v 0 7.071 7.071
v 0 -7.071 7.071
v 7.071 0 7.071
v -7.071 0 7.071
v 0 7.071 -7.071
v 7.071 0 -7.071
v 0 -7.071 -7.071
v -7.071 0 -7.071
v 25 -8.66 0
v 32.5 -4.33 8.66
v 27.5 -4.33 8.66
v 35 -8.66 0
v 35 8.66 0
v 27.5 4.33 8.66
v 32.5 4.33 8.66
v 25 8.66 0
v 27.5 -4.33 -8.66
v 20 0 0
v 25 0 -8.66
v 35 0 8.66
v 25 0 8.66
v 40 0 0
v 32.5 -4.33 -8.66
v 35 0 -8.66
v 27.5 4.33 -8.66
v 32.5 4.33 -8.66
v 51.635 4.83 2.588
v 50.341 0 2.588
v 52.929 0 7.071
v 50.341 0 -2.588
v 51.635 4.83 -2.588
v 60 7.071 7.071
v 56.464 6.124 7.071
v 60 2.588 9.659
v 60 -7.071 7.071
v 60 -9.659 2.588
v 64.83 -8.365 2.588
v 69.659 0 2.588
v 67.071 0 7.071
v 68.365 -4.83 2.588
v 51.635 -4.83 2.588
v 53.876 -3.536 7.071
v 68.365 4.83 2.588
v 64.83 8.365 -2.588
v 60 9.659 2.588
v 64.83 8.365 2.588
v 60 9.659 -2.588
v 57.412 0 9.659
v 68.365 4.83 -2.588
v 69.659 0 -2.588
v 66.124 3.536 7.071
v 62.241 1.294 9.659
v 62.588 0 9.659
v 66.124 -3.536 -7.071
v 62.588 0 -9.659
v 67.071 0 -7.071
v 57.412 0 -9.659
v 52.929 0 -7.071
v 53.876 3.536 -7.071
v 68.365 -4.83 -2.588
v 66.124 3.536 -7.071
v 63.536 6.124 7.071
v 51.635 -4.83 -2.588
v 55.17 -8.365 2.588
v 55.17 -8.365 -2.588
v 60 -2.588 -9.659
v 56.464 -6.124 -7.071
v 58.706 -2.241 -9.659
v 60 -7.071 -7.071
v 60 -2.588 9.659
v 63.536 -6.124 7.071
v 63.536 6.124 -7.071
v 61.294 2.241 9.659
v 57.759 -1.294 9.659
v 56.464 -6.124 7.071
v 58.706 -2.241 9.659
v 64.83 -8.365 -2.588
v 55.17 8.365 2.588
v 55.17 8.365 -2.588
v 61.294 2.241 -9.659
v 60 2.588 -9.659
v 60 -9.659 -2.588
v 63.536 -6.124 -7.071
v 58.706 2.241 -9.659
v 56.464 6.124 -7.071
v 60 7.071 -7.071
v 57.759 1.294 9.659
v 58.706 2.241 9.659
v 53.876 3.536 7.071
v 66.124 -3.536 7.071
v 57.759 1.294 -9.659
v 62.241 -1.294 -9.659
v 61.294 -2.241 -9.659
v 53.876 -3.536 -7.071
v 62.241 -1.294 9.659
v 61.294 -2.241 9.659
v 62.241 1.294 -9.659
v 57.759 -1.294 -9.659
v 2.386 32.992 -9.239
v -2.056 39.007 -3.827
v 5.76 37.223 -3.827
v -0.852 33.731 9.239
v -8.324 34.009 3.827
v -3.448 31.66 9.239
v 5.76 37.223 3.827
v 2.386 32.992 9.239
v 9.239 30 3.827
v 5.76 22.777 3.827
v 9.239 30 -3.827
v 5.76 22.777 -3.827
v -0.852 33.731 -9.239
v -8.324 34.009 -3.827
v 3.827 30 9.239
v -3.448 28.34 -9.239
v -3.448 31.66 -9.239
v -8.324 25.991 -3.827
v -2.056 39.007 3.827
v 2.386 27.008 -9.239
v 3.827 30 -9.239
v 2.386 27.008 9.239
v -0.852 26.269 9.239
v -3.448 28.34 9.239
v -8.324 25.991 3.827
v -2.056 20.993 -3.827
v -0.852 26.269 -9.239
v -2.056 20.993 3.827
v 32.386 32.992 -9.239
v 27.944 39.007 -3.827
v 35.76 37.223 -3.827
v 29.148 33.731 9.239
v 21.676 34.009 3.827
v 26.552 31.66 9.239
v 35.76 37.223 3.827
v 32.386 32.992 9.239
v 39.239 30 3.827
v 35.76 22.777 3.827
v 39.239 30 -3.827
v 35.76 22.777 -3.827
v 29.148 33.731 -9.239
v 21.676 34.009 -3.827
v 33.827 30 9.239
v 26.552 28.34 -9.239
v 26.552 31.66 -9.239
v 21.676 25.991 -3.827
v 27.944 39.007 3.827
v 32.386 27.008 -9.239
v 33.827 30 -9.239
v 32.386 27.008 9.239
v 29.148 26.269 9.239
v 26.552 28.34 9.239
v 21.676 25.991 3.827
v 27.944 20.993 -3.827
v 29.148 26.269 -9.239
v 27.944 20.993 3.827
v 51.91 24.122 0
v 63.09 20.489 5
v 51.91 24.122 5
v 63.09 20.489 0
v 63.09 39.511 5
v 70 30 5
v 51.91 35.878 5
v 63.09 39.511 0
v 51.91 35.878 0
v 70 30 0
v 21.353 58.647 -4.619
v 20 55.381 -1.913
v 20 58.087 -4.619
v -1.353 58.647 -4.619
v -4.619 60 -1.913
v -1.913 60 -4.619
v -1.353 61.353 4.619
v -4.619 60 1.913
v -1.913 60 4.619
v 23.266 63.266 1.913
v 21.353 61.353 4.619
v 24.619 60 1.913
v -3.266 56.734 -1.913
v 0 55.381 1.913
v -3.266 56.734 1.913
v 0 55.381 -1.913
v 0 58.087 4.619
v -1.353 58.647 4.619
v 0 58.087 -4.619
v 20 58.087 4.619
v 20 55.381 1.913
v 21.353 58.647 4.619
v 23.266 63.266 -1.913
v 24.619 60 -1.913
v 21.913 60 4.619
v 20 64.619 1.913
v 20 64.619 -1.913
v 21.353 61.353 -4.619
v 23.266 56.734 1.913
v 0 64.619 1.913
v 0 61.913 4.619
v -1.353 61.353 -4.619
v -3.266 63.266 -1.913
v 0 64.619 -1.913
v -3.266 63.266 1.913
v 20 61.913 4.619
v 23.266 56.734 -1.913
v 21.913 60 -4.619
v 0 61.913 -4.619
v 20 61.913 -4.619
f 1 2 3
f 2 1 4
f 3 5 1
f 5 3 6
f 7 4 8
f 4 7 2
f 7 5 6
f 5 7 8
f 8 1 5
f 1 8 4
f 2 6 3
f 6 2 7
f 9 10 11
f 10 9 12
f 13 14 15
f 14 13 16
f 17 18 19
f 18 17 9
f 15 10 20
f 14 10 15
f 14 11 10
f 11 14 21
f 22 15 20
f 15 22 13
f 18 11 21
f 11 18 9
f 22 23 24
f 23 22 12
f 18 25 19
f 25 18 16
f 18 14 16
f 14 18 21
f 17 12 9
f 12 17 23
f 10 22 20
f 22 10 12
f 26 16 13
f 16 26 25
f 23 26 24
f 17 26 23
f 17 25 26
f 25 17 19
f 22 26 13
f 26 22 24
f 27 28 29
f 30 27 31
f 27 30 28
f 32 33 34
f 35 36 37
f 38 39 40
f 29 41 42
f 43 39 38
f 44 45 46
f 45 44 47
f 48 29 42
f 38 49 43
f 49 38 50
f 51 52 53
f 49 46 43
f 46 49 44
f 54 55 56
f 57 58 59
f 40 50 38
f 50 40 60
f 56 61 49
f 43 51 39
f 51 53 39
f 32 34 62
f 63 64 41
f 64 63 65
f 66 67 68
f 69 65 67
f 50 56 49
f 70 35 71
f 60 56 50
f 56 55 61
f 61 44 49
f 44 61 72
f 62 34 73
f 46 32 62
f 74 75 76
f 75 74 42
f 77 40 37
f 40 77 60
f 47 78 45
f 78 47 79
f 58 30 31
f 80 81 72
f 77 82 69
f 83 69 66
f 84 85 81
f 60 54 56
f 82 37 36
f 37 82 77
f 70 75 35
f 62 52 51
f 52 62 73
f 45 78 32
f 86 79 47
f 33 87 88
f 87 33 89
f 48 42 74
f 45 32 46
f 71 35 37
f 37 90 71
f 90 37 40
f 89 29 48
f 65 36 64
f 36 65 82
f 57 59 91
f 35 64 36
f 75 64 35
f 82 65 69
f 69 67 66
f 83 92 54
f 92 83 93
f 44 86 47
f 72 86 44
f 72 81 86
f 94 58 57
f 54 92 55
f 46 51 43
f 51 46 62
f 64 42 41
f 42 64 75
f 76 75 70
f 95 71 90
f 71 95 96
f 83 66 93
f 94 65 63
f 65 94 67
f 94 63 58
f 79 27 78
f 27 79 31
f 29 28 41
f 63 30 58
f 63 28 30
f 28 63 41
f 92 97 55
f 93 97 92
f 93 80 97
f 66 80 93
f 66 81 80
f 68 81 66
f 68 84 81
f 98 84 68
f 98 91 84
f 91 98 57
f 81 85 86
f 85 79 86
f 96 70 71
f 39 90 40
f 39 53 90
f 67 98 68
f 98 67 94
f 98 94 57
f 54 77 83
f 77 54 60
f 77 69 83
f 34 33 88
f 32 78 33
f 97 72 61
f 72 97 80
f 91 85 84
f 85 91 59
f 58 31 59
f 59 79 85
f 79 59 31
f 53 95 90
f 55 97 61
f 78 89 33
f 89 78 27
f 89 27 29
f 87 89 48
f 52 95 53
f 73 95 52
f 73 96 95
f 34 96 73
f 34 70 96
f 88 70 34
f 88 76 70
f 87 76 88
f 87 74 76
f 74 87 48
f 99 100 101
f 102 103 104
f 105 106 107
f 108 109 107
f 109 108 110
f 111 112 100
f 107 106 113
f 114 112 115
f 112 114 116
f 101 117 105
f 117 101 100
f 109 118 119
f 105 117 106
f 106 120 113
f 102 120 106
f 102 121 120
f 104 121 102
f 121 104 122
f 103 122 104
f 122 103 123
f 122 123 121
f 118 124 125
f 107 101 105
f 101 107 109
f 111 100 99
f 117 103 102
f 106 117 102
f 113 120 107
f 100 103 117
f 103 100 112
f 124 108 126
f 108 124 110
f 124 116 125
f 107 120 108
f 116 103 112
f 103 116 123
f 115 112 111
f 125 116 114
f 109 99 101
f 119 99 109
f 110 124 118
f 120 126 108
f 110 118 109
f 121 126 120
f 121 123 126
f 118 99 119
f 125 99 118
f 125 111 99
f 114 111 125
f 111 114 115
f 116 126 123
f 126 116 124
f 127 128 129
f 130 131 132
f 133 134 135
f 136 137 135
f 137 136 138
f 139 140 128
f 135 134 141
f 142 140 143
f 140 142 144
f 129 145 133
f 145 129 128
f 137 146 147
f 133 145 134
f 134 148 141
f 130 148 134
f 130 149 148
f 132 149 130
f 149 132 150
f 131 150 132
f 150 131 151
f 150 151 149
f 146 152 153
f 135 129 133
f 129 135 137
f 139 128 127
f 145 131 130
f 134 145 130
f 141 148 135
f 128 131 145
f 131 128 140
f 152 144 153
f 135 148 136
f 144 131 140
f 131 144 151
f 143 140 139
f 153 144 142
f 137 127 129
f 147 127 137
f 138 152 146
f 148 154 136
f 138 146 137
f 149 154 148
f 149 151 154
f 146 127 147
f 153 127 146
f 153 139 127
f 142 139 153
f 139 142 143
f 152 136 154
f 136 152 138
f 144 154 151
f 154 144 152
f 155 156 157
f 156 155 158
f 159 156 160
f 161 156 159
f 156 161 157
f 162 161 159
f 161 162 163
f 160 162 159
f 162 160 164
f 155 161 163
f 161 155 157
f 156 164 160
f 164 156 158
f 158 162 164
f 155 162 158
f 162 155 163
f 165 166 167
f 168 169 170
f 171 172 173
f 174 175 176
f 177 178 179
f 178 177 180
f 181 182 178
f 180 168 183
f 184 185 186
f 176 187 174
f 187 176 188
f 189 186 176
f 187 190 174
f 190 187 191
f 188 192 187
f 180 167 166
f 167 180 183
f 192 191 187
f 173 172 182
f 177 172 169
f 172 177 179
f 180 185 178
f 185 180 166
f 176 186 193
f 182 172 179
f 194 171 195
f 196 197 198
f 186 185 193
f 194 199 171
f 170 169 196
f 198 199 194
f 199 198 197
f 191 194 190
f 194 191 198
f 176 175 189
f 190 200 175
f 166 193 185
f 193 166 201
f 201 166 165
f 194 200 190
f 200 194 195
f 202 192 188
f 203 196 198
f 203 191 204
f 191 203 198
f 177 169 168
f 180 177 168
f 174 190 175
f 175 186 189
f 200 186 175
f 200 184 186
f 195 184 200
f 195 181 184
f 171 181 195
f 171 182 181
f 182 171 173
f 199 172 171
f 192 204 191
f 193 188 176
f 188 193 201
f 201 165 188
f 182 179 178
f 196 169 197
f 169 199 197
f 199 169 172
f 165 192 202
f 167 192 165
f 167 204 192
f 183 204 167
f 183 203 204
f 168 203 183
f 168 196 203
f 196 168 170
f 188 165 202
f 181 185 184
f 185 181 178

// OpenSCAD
// sphere(style = "octa") (OpenSCAD 2026): the subdivided octahedron, point for point — 1, 2 and 3 subdivisions
sphere(r = 10, $fn = 4, style = "octa");
translate([30, 0, 0]) sphere(r = 10, $fn = 6, style = "octa");
translate([60, 0, 0]) sphere(r = 10, $fn = 12, style = "octa");
// the ring sphere, said and unsaid
translate([0, 30, 0]) sphere(r = 10, $fn = 7, style = "orig");
translate([30, 30, 0]) sphere(r = 10, $fn = 7);
// a fractional $fn rounds up since 2026: a hexagonal prism, not a pentagonal one
translate([60, 30, 0]) cylinder(r = 10, h = 5, $fn = 5.5);
// octa spheres hulled into a low-poly capsule
translate([0, 60, 0]) hull() { sphere(r = 5, $fn = 8, style = "octa"); translate([20, 0, 0]) sphere(r = 5, $fn = 8, style = "octa"); }
